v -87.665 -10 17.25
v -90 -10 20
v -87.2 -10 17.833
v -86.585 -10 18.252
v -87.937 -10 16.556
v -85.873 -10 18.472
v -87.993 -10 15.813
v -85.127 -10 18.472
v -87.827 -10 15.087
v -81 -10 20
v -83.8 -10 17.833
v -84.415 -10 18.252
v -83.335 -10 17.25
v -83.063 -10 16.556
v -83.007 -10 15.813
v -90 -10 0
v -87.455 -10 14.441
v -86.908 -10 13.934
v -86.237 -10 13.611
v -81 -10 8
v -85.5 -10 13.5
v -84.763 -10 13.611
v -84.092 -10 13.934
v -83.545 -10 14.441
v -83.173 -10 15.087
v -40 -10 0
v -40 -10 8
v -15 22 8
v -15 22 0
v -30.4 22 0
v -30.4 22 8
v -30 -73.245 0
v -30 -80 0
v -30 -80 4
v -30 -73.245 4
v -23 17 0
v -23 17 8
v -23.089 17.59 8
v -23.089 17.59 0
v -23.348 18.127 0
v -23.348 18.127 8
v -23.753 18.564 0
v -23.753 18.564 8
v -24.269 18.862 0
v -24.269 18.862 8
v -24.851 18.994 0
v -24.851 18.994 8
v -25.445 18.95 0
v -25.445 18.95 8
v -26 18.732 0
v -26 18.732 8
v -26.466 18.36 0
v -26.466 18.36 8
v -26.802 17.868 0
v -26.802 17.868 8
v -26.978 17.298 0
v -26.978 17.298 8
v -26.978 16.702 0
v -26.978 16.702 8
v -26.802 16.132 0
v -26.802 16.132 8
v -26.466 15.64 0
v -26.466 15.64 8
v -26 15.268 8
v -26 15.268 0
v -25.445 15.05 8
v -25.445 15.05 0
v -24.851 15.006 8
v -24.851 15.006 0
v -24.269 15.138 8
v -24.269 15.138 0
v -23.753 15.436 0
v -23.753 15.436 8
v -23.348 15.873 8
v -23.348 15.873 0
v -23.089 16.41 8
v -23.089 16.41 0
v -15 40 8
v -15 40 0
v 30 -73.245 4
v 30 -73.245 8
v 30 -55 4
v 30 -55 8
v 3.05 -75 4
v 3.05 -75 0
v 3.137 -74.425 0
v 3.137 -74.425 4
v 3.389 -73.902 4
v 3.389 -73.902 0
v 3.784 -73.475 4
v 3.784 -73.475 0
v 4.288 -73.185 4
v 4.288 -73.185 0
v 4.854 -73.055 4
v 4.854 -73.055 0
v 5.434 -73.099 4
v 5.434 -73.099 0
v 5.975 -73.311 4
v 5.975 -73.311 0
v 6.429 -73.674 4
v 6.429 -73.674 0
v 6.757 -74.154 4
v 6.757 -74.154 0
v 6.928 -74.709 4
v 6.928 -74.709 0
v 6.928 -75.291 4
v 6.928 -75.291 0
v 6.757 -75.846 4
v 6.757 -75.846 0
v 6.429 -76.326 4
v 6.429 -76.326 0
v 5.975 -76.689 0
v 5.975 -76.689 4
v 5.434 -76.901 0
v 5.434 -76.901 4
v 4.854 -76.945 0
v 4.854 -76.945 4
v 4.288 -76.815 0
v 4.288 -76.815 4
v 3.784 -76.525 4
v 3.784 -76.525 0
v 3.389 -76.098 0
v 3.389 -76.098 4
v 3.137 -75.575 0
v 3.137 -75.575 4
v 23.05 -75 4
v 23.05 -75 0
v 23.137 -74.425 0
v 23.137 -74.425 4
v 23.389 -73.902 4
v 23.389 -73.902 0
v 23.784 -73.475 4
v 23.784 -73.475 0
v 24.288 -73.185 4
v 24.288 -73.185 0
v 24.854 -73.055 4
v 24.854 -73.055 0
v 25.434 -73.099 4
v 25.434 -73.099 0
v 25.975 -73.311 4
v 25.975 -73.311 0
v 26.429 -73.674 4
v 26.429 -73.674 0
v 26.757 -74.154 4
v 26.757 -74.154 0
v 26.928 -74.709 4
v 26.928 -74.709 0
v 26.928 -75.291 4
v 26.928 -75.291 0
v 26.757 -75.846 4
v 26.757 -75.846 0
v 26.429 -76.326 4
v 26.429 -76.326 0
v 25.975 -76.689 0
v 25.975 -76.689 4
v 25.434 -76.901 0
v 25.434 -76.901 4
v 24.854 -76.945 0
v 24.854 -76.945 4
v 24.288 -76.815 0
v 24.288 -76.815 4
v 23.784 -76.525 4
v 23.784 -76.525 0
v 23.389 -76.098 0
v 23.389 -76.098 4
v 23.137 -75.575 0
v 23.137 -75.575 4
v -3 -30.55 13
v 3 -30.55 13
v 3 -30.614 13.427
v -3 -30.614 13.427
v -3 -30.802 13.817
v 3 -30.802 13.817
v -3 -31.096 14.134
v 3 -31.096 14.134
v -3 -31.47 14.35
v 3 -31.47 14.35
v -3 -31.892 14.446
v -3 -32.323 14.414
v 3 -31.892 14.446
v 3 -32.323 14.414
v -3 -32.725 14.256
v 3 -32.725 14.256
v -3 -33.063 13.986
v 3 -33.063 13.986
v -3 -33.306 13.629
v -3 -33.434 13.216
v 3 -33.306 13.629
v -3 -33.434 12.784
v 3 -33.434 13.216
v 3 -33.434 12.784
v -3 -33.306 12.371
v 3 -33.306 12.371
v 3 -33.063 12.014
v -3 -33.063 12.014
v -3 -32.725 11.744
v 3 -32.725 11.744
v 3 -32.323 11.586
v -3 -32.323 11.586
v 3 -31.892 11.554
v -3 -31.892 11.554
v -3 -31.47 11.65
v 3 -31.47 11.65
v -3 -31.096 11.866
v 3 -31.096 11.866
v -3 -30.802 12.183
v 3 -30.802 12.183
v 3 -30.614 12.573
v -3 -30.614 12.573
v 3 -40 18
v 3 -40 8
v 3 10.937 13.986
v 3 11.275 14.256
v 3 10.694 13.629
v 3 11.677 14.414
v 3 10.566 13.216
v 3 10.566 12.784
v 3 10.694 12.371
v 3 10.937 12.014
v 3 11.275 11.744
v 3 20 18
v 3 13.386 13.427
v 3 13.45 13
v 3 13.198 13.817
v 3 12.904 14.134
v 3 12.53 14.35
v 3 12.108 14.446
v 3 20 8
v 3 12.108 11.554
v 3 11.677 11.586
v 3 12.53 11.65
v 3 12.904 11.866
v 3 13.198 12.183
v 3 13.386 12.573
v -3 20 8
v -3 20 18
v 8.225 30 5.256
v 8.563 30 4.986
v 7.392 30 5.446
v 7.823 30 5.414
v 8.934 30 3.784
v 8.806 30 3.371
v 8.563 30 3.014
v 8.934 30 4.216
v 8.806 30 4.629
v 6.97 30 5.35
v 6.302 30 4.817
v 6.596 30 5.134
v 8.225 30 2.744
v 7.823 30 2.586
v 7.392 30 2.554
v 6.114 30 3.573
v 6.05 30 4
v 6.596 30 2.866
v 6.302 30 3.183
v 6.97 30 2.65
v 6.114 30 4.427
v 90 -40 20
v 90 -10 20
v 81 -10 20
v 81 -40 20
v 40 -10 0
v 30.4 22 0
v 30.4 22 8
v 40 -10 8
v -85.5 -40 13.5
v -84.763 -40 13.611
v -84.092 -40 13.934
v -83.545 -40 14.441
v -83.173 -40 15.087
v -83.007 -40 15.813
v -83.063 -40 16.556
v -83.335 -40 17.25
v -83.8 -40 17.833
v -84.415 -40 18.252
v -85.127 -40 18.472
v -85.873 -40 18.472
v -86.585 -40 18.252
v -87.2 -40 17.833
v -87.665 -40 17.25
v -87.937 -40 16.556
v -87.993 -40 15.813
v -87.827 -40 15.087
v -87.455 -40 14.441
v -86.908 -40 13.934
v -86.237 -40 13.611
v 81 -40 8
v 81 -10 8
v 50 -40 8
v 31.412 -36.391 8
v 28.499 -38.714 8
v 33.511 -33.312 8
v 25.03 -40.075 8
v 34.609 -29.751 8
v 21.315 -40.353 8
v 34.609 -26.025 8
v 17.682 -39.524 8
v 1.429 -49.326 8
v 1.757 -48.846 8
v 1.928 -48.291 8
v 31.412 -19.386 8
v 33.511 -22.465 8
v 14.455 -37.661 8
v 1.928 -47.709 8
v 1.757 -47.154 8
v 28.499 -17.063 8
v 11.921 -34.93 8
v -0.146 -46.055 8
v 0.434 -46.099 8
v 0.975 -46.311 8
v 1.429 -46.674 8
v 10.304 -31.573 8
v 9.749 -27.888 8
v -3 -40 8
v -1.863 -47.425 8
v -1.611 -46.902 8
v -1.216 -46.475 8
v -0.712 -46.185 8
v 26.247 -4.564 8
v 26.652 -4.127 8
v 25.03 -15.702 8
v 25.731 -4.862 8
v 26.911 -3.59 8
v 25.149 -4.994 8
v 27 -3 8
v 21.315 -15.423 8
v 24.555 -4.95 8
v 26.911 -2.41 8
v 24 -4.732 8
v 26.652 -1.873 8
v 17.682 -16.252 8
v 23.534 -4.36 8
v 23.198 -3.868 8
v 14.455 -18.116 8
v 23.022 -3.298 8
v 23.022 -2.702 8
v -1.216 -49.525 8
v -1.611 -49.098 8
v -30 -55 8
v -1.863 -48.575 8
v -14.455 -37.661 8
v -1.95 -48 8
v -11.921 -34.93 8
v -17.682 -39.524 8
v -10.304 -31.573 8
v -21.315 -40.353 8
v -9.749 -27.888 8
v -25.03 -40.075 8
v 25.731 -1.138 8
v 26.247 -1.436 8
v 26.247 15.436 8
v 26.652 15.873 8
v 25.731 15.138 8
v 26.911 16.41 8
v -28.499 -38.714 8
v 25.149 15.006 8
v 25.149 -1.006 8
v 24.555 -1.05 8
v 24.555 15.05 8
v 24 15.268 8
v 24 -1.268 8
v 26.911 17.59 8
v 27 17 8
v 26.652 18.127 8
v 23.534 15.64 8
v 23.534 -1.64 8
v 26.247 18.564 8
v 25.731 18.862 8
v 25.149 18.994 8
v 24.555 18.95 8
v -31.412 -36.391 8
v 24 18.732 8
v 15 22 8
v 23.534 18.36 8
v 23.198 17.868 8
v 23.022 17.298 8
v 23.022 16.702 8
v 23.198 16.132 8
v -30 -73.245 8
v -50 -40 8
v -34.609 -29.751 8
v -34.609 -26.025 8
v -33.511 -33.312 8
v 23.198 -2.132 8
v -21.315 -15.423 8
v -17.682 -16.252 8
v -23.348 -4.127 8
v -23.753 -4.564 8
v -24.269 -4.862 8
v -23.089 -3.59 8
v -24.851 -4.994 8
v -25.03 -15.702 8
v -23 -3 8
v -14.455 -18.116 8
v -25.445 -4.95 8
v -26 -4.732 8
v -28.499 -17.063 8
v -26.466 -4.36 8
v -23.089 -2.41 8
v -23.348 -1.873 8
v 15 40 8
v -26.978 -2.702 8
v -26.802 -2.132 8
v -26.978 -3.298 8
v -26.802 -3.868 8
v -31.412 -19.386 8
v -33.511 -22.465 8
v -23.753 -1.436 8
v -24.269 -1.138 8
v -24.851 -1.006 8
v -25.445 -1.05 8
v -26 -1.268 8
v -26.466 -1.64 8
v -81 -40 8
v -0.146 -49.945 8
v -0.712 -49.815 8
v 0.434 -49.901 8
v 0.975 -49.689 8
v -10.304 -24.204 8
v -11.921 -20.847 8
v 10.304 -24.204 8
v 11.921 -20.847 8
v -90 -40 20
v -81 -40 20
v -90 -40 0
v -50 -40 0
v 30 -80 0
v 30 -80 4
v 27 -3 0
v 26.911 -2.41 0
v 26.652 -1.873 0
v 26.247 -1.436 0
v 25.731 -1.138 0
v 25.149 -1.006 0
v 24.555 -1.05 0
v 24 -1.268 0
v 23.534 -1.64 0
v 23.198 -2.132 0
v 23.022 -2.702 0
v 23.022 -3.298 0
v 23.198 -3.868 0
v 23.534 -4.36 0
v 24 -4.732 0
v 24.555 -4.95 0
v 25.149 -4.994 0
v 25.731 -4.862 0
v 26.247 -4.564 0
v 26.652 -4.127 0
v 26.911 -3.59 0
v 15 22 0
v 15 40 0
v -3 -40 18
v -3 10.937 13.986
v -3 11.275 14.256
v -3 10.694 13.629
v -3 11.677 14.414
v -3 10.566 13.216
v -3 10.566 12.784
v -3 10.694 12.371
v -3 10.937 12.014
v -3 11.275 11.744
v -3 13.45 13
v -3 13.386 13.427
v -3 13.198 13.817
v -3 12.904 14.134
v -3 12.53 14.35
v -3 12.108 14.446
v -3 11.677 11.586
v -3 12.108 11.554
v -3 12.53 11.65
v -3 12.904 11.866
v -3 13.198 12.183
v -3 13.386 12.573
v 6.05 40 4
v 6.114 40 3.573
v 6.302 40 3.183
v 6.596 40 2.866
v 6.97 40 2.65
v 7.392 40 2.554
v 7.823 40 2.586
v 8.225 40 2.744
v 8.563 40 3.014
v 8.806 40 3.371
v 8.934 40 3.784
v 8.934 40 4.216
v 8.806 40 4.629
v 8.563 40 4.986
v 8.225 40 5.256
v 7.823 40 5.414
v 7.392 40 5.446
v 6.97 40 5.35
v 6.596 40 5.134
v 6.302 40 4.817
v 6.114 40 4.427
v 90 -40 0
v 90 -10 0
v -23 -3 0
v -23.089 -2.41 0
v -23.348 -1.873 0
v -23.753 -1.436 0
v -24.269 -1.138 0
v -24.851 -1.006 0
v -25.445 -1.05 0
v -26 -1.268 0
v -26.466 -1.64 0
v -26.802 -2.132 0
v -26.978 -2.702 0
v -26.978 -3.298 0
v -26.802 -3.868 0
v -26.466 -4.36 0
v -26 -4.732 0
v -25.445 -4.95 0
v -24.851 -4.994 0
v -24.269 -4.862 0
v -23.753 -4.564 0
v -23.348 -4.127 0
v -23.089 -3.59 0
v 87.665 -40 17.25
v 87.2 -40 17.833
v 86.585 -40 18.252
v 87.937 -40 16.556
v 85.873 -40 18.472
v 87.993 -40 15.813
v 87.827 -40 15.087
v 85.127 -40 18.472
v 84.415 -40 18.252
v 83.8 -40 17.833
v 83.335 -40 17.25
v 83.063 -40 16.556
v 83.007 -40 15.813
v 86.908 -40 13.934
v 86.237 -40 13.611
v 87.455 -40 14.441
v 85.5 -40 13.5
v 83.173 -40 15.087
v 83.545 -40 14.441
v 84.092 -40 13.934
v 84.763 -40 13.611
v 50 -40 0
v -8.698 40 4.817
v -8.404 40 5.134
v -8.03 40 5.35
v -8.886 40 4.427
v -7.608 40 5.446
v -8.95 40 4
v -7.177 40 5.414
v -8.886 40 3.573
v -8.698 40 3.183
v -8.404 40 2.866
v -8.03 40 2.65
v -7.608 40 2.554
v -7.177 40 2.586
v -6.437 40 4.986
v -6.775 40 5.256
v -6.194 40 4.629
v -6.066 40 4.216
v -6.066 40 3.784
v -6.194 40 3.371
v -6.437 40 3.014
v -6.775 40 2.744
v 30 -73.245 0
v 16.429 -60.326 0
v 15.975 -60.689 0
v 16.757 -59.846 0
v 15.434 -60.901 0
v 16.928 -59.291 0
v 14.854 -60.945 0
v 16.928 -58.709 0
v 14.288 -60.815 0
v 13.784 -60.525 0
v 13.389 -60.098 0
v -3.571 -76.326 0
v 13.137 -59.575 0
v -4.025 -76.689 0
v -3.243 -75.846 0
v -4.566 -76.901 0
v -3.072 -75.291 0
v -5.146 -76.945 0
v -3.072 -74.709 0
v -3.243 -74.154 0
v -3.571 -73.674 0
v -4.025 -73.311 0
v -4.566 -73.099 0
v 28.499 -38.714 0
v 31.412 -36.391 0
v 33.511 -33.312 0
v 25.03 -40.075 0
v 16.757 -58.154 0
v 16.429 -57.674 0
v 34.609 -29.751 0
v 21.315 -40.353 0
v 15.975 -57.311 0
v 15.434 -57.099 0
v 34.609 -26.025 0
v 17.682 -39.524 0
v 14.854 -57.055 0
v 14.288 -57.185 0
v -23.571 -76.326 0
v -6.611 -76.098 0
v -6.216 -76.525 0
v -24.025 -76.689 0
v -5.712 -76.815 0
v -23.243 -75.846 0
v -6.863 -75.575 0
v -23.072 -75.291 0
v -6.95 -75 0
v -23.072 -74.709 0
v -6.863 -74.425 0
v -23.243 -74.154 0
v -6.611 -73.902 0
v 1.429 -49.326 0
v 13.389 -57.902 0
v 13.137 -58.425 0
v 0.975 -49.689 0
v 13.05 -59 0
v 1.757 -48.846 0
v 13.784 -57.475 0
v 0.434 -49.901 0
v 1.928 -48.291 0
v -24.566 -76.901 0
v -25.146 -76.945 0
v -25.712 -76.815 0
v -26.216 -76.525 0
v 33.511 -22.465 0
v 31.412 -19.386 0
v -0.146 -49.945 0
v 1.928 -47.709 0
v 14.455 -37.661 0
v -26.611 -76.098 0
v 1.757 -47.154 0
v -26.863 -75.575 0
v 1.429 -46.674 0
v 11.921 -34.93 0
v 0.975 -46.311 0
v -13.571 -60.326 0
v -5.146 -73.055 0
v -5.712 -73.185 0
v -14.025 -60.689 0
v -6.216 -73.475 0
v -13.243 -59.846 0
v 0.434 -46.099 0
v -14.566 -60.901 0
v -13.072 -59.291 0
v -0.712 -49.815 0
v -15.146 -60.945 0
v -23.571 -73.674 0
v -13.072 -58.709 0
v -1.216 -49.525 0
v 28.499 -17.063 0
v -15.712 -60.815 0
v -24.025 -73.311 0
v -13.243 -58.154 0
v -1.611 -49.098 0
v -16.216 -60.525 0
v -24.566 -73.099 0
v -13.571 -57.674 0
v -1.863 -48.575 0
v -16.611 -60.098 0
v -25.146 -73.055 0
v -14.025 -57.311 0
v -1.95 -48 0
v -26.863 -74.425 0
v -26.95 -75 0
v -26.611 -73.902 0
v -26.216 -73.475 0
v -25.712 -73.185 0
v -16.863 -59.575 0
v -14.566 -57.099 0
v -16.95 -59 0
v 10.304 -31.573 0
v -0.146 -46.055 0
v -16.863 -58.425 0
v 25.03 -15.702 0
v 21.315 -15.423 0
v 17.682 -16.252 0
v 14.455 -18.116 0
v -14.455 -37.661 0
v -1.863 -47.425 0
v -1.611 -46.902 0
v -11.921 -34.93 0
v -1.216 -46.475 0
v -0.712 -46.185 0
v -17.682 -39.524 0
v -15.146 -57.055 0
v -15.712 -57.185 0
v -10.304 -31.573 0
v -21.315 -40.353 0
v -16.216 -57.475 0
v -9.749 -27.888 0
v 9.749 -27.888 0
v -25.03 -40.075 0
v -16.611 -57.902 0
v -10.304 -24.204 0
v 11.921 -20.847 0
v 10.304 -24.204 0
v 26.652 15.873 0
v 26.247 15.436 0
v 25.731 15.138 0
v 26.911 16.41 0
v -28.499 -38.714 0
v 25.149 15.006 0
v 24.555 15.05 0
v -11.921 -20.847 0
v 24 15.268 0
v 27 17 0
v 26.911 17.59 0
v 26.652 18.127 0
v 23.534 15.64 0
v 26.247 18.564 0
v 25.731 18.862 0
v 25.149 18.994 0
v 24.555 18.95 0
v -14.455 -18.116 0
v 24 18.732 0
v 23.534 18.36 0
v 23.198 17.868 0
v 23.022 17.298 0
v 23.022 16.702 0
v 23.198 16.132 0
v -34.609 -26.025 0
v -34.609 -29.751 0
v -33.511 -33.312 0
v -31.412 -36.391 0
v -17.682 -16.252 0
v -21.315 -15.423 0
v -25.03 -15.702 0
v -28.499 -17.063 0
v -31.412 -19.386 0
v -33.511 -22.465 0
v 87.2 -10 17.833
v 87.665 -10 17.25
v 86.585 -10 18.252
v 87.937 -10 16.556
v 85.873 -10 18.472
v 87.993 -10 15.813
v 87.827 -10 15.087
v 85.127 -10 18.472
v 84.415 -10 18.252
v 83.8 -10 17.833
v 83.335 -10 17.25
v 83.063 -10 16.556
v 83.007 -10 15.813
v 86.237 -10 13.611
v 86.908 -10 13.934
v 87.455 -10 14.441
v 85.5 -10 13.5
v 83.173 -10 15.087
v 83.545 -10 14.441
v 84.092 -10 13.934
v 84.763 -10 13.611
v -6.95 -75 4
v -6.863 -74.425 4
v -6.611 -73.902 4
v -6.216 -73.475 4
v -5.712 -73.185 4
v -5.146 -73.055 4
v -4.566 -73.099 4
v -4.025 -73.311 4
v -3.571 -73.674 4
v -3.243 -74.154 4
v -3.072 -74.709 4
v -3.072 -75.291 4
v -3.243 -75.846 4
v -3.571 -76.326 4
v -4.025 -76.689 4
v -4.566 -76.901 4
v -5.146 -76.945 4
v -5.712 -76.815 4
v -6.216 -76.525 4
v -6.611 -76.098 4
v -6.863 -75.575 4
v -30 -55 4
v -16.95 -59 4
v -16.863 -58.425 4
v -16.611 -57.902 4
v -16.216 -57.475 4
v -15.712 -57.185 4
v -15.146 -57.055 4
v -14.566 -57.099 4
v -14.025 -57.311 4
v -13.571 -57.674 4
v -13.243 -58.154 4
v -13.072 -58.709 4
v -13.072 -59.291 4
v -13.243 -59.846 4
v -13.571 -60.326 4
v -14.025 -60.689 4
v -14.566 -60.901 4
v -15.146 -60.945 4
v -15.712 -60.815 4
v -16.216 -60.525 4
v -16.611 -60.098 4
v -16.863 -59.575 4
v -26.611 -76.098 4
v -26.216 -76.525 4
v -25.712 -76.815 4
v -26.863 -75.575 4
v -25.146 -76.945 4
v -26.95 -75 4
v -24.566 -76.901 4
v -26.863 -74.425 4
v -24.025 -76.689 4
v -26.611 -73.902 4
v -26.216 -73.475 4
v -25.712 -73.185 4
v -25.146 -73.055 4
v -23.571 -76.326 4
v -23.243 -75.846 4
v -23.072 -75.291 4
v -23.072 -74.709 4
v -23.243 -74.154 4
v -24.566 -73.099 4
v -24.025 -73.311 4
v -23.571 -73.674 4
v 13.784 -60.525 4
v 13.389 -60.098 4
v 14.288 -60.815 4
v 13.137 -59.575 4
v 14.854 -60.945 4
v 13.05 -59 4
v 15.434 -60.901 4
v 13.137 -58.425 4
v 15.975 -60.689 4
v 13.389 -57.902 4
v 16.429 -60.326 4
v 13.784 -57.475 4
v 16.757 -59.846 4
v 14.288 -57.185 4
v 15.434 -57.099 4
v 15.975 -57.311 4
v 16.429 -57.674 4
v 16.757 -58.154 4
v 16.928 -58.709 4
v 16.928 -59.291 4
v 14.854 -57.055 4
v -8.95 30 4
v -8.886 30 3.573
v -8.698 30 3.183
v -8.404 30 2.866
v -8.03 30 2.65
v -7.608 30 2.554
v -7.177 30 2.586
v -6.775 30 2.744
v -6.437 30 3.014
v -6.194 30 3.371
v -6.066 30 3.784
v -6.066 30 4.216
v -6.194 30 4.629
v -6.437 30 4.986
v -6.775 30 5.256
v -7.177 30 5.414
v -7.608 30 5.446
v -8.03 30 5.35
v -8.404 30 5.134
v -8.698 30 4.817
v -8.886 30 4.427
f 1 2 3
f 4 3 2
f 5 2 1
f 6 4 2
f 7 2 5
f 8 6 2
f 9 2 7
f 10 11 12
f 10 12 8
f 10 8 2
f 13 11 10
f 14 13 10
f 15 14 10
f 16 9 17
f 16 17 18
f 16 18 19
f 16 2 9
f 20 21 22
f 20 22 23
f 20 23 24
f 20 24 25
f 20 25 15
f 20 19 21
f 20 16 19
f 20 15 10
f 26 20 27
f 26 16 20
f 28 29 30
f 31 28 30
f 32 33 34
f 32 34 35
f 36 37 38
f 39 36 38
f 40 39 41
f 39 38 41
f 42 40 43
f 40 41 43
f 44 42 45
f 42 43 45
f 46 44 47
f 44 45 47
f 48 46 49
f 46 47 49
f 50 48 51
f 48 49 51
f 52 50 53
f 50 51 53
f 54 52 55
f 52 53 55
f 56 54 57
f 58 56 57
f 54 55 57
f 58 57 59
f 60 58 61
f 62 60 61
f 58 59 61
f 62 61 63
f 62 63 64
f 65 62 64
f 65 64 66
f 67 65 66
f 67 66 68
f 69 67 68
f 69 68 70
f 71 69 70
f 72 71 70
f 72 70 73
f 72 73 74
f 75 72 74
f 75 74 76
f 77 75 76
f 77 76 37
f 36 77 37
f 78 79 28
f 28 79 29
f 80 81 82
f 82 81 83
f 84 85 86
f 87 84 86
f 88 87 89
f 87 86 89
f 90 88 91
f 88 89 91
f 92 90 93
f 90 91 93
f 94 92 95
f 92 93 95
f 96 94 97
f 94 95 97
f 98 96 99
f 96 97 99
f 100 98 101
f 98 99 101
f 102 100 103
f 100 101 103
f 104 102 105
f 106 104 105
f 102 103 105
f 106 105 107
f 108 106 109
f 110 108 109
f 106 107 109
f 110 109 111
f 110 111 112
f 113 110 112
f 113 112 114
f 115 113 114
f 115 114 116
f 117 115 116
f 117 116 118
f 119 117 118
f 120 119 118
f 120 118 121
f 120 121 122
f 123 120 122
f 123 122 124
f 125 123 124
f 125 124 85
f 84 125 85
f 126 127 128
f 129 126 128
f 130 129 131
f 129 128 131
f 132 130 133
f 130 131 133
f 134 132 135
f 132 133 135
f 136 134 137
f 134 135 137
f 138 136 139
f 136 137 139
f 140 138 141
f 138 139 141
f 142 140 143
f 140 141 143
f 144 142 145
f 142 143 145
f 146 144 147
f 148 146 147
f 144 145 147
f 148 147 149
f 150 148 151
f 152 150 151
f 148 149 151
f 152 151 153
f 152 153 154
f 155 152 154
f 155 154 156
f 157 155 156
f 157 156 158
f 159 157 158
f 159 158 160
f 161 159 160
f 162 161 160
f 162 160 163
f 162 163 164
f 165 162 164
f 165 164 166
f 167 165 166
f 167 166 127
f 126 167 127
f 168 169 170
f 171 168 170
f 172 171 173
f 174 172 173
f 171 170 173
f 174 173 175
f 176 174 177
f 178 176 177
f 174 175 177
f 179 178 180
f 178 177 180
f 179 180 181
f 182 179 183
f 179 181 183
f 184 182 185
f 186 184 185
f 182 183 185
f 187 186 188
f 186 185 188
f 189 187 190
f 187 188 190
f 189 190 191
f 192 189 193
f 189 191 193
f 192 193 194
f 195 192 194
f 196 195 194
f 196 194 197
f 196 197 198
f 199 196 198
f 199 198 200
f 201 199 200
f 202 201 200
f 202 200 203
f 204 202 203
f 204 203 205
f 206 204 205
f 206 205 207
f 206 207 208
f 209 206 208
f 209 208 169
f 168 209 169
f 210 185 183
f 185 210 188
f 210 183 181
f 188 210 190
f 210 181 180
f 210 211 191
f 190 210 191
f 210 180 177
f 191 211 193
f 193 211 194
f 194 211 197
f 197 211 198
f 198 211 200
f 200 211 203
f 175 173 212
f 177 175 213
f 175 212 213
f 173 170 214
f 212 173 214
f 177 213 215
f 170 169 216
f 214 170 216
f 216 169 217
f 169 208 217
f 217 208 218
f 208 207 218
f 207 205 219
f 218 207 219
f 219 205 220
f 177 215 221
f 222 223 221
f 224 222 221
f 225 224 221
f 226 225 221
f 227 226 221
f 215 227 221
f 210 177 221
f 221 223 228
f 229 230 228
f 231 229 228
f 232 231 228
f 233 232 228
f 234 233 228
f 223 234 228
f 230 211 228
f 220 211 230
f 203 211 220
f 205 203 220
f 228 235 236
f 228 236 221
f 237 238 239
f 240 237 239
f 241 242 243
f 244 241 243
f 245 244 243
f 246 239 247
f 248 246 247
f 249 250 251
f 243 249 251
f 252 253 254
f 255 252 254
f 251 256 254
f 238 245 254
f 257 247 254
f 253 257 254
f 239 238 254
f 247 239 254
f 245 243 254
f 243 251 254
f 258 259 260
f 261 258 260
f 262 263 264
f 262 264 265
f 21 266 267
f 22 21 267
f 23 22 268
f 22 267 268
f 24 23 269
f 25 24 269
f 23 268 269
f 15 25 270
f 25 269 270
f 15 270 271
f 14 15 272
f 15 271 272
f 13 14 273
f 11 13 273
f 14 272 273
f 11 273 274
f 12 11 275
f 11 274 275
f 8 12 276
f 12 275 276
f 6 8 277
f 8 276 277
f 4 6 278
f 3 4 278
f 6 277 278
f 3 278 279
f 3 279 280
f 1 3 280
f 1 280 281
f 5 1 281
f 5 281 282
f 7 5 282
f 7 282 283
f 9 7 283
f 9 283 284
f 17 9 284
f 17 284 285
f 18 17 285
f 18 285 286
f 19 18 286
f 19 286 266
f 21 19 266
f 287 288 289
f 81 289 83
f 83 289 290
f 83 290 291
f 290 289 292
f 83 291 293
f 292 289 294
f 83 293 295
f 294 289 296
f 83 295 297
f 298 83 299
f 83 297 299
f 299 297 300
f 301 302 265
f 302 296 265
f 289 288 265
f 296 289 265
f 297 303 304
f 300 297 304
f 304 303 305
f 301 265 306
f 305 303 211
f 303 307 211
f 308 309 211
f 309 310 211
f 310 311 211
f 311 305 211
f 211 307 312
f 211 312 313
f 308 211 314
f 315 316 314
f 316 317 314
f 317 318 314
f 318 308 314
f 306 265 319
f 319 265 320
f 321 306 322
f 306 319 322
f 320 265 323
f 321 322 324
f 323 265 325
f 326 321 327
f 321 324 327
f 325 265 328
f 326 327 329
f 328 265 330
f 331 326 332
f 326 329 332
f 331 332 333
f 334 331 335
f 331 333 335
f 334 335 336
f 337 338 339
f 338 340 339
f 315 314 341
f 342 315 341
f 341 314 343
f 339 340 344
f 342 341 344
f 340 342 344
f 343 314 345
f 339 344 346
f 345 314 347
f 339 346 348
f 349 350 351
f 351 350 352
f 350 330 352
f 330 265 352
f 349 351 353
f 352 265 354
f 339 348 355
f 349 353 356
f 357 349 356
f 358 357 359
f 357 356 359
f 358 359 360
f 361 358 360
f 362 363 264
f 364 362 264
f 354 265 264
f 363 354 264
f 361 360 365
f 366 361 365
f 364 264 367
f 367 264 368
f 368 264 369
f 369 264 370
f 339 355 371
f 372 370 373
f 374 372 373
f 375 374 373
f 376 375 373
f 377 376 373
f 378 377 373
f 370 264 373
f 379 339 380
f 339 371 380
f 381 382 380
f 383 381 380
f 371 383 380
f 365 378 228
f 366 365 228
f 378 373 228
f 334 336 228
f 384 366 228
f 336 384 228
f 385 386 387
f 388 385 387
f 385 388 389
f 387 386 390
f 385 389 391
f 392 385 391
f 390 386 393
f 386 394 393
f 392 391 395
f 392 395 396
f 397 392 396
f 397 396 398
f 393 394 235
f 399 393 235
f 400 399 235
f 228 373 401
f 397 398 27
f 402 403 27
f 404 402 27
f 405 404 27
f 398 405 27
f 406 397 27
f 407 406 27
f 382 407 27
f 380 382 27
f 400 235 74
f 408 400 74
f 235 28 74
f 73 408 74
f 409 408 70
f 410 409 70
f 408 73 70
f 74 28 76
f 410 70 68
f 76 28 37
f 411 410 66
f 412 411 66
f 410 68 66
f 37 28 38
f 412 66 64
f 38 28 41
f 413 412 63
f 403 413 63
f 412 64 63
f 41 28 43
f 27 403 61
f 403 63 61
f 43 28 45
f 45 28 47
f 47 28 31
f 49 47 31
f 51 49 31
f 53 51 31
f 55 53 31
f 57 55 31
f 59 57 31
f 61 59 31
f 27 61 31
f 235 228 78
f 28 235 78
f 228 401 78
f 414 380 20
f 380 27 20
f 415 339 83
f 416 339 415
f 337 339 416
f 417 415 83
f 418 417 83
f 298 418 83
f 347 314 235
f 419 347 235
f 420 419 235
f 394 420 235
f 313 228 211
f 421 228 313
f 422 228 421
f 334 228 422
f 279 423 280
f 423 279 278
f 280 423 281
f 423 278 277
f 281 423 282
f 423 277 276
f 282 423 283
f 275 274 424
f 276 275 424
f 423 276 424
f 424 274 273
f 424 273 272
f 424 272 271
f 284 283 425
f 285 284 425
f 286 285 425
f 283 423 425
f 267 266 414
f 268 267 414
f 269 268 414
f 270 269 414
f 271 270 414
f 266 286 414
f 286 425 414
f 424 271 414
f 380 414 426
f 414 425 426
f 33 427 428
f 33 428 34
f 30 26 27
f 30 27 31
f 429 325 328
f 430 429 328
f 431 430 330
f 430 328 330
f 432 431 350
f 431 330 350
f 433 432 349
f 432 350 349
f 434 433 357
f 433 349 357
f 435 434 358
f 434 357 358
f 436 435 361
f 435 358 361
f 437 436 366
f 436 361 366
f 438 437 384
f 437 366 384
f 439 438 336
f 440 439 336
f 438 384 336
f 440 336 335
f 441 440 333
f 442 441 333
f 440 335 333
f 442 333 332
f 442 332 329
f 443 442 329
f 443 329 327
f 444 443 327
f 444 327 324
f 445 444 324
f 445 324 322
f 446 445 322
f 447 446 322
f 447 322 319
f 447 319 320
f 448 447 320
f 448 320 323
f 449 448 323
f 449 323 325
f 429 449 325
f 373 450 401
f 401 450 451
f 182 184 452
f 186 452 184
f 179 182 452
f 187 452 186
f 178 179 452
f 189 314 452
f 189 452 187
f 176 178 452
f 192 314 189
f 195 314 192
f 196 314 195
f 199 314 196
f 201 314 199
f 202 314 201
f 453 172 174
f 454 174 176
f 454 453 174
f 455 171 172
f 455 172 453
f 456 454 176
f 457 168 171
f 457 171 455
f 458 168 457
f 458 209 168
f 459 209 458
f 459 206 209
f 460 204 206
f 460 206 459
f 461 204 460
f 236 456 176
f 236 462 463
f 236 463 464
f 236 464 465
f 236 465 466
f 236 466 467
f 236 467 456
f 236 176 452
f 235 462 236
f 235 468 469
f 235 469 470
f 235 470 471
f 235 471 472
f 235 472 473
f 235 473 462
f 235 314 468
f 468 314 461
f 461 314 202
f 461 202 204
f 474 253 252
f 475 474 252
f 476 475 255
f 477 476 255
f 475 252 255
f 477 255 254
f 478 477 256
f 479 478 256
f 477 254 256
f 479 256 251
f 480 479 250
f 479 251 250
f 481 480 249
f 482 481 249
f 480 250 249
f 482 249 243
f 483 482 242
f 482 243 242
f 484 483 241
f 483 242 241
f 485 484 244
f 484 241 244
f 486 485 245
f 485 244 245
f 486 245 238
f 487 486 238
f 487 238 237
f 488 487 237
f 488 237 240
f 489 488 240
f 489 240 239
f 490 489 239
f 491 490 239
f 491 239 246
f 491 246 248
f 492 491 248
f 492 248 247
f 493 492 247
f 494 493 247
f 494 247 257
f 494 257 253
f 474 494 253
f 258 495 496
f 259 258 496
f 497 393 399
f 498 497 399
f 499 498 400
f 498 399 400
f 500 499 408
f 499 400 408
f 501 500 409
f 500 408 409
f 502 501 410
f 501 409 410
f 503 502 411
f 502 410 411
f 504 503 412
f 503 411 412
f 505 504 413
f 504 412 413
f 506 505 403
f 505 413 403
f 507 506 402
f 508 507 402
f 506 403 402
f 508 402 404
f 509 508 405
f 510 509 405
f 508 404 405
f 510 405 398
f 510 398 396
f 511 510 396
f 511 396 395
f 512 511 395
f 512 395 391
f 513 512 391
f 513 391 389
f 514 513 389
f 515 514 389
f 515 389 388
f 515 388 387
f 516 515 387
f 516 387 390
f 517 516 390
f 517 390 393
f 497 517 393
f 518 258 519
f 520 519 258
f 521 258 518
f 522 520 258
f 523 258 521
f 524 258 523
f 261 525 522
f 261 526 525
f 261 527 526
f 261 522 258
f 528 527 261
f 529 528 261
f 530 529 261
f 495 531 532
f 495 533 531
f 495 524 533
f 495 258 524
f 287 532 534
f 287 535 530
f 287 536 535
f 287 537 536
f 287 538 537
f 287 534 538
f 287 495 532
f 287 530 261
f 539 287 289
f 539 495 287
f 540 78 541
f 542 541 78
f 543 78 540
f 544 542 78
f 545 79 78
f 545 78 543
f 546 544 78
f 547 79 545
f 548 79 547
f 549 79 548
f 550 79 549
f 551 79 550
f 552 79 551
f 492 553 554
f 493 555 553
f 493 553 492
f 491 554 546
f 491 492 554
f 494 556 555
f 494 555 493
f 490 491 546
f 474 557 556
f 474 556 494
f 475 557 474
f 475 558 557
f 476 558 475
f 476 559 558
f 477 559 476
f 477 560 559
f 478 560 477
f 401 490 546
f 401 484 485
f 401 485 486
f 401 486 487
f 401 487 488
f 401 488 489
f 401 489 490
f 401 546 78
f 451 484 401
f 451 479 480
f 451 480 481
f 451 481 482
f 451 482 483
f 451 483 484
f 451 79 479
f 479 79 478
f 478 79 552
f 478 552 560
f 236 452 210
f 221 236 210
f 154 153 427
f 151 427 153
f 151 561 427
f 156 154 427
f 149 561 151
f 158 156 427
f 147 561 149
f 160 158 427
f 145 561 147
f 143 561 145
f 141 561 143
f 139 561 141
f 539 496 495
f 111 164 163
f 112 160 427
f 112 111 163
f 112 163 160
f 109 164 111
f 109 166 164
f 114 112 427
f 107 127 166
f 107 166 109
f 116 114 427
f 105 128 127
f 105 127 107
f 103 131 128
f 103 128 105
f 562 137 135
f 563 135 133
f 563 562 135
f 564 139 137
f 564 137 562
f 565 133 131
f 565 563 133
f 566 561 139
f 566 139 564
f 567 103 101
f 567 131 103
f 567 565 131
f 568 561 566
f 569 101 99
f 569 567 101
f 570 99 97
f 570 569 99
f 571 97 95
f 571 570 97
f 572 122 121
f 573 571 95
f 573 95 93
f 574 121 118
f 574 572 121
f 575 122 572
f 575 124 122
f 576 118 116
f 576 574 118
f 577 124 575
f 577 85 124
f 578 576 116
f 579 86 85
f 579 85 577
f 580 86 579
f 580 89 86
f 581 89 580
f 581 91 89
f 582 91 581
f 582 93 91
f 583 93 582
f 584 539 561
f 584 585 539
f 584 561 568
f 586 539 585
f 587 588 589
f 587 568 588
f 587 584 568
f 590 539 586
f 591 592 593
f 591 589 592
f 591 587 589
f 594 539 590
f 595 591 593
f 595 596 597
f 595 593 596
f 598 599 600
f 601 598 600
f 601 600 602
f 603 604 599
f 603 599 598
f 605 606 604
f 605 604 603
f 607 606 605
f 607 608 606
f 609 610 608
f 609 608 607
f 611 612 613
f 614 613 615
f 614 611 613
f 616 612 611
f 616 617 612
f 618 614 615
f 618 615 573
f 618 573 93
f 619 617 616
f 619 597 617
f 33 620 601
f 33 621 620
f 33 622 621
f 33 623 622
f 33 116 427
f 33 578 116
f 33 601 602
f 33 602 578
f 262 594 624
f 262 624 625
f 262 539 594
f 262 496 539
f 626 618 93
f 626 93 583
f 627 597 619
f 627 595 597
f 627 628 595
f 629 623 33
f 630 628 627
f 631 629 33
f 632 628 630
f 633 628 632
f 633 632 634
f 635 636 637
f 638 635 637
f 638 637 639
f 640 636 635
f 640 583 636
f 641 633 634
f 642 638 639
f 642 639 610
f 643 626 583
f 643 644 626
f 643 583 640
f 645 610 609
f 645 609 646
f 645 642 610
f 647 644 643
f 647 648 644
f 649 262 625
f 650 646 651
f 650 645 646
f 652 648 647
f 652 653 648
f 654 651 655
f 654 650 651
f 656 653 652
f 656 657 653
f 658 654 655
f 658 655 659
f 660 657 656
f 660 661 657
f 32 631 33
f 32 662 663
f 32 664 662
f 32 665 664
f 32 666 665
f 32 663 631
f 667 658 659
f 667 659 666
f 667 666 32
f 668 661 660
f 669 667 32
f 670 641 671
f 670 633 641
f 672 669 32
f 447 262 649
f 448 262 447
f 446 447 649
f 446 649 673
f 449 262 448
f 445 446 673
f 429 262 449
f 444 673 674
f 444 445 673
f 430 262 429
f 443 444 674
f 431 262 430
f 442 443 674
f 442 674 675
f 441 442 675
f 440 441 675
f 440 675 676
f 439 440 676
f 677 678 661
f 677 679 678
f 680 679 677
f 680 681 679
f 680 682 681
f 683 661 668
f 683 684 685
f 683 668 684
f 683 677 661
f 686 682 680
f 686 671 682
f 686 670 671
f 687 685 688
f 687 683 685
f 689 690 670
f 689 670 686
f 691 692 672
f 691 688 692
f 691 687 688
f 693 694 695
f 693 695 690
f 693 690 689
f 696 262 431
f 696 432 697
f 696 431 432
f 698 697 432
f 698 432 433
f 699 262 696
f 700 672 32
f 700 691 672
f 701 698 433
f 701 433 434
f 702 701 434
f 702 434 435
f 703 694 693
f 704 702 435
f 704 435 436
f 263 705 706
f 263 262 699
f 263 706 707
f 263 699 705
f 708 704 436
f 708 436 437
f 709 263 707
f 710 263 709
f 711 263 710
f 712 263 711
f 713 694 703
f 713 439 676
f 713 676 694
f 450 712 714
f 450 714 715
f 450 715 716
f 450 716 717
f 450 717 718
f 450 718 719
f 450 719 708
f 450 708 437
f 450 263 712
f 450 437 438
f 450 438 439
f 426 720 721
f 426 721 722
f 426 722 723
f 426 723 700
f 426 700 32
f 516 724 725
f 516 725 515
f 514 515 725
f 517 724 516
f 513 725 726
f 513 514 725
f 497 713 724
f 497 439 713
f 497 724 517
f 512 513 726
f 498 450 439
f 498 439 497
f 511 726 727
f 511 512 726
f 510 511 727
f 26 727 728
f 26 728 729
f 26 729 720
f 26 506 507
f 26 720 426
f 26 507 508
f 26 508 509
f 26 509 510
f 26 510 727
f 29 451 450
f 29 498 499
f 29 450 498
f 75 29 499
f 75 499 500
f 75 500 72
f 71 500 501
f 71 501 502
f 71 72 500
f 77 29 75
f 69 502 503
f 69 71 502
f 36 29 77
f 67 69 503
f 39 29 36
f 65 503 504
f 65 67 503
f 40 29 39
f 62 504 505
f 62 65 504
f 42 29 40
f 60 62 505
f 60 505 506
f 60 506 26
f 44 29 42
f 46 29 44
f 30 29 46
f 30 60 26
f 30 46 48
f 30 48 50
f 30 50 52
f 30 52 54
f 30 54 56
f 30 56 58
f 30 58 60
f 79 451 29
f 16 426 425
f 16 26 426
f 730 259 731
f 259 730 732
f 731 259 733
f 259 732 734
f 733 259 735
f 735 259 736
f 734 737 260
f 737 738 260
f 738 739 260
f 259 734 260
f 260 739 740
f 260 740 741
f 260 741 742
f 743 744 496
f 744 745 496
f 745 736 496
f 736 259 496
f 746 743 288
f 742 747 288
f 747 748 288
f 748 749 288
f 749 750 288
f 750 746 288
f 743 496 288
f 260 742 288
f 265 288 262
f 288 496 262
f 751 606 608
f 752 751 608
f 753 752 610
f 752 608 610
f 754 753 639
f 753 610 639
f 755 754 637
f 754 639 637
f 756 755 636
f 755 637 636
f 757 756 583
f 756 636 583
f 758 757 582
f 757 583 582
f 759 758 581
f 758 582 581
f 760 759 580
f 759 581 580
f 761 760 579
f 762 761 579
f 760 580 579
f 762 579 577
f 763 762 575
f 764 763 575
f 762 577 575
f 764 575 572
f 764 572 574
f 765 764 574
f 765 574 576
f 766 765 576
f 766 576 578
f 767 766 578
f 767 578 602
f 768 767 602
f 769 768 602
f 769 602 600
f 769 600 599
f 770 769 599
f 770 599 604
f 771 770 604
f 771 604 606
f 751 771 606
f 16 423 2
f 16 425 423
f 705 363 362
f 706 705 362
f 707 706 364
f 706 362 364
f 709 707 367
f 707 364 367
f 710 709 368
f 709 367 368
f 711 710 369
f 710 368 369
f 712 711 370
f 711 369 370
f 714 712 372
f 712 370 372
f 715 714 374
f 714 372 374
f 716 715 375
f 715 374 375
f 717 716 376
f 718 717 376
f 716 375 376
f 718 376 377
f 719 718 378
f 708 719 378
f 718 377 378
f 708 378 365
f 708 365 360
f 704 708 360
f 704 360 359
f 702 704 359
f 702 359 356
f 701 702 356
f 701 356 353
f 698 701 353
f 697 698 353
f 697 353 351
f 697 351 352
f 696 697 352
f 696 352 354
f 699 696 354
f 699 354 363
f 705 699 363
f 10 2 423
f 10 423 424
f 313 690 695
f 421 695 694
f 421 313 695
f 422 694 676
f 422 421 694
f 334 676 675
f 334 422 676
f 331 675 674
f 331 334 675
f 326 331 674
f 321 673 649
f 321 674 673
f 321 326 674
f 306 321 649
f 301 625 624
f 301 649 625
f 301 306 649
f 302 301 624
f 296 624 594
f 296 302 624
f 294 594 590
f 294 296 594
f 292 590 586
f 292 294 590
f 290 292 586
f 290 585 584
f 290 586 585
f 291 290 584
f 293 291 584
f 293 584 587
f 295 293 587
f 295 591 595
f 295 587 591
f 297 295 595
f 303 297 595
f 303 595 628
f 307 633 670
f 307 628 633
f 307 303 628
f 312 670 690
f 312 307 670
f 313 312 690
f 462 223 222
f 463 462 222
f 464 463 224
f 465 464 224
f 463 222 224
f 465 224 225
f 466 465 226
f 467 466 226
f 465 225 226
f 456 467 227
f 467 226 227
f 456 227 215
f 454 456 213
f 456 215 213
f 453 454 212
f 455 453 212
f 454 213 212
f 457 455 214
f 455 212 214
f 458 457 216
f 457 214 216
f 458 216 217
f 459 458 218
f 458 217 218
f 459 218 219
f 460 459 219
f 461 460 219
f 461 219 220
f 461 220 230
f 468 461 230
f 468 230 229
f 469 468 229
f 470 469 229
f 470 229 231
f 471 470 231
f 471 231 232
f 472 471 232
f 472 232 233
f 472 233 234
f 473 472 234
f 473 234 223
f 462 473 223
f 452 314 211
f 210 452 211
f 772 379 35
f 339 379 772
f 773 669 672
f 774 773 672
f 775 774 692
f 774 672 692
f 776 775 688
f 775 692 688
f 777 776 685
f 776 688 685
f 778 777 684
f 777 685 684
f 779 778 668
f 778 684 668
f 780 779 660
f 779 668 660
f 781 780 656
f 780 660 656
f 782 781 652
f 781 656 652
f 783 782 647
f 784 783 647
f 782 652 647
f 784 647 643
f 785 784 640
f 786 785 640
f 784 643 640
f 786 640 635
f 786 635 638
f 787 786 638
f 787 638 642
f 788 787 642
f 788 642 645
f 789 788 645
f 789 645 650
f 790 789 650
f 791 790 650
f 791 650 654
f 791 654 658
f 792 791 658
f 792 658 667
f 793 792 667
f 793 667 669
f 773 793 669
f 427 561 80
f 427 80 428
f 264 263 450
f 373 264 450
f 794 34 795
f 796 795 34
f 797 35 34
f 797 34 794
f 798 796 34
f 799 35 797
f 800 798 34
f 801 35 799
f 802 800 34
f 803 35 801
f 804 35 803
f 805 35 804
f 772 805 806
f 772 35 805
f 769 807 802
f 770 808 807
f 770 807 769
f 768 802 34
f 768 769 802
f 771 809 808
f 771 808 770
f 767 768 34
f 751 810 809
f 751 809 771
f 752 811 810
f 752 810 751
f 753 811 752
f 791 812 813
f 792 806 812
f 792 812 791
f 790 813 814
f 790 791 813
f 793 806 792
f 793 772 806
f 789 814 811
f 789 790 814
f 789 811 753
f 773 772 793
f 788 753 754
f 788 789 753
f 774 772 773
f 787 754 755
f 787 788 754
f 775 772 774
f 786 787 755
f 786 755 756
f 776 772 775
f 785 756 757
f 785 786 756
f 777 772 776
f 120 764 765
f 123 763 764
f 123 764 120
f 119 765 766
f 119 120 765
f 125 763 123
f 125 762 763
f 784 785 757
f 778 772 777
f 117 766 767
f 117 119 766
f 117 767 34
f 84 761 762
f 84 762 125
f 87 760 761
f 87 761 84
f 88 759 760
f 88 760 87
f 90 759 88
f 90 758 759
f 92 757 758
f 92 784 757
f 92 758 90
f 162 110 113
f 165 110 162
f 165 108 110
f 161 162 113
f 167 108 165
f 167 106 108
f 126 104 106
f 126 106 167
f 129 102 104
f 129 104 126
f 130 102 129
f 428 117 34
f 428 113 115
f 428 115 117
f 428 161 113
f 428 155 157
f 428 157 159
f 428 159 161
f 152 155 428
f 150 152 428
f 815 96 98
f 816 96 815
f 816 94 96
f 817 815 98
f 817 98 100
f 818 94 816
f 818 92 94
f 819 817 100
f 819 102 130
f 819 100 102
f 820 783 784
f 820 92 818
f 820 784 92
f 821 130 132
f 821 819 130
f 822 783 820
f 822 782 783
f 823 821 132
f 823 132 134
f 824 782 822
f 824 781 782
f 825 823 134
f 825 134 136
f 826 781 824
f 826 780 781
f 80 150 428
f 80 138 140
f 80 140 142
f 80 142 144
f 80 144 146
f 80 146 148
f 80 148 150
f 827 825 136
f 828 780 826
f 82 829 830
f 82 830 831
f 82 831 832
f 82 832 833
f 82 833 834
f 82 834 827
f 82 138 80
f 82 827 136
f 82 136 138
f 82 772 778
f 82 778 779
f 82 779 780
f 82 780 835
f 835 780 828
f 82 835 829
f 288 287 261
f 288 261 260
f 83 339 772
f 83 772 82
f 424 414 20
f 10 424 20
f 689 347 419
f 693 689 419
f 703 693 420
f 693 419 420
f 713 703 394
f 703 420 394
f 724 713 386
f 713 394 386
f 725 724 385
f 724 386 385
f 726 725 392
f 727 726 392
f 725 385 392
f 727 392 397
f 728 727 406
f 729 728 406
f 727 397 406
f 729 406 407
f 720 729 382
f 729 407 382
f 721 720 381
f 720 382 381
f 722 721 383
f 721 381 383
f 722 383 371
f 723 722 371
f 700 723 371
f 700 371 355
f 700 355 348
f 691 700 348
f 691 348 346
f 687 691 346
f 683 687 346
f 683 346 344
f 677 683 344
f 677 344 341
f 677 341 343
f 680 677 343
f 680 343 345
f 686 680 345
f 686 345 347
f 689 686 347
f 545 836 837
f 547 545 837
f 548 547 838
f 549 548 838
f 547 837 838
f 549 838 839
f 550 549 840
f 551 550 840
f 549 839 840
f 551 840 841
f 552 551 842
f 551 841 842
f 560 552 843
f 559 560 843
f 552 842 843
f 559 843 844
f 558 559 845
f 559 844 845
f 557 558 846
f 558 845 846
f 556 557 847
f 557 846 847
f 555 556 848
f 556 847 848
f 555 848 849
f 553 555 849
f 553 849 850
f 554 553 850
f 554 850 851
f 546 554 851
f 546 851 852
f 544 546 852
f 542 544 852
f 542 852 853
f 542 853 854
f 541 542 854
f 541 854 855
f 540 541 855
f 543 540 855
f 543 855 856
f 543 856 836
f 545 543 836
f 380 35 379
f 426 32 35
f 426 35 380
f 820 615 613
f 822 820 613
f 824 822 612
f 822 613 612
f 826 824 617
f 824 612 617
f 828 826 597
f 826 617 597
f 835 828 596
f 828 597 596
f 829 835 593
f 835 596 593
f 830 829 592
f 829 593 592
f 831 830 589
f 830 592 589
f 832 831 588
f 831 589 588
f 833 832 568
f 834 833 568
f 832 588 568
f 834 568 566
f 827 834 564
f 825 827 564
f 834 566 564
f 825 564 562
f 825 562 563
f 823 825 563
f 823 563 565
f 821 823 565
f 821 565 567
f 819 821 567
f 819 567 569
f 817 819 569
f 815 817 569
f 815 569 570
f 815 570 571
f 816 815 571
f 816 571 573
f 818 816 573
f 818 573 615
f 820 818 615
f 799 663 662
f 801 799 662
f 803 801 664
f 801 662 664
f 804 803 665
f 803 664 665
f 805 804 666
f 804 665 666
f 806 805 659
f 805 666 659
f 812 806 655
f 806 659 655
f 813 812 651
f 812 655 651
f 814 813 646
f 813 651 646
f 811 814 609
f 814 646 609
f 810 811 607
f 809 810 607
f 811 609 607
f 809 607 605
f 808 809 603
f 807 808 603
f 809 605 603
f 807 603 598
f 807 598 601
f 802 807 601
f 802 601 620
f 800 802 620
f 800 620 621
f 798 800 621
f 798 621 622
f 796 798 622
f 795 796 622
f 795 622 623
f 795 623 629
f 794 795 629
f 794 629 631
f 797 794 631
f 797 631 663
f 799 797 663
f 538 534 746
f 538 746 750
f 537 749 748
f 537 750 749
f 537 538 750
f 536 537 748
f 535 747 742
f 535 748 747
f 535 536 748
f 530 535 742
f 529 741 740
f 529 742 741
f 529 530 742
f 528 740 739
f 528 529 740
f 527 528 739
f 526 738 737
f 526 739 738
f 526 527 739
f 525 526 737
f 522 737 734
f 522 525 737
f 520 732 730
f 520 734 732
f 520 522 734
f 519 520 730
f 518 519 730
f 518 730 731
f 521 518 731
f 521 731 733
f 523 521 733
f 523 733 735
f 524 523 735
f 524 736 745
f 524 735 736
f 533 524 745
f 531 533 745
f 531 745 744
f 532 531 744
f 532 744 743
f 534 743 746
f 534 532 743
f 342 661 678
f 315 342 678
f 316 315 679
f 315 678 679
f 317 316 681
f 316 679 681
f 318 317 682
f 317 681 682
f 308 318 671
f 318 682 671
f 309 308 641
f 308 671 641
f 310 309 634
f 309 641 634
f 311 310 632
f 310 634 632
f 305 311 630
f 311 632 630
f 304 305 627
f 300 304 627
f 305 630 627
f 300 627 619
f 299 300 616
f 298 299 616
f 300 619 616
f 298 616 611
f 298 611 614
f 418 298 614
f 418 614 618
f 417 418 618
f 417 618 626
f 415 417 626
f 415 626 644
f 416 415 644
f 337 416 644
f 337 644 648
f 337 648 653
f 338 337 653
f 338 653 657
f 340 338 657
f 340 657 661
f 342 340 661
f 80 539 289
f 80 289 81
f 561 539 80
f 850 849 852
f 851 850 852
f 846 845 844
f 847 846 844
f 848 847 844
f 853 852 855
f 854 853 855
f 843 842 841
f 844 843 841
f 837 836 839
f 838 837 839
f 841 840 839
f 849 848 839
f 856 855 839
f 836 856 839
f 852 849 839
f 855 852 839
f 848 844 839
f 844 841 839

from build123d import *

# Parameters (mm, degrees)
EXTRUDE1_DEPTH                 = 8
EXTRUDE2_DEPTH                 = 8
SKETCH4_W                      = 6
SKETCH4_H                      = 60
EXTRUDE3_DEPTH                 = 10
F_4_0_4_DIAMETER_HOLE2_D       = 4
F_4_0_4_DIAMETER_HOLE2_DEPTH   = 15
SKETCH6_W                      = 9
SKETCH6_H                      = 30
EXTRUDE4_DEPTH                 = 12
F_5_0_5_DIAMETER_HOLE1_D       = 5
F_2_9_2_9_DIAMETER_HOLE1_D     = 2.9
F_2_9_2_9_DIAMETER_HOLE1_DEPTH = 10
SKETCH10_R                     = 12.5
EXTRUDE5_DEPTH                 = 10
F_2_9_2_9_DIAMETER_HOLE2_D     = 2.9
F_2_9_2_9_DIAMETER_HOLE2_DEPTH = 10
EXTRUDE8_DEPTH                 = 21
SKETCH15_W                     = 60
SKETCH15_H                     = 25
EXTRUDE9_DEPTH                 = 4
F_4_0_4_DIAMETER_HOLE4_D       = 3.9
F_4_0_4_DIAMETER_HOLE4_DEPTH   = 15
F_4_0_4_DIAMETER_HOLE5_D       = 3.9
F_4_0_4_DIAMETER_HOLE5_DEPTH   = 15


with BuildPart() as part:
    # Sketch1 → Extrude1 (new body)
    with BuildSketch(Plane.XY):
        Polygon((-40, -10), (-25, 40), (25, 40), (40, -10), (90, -10), (90, -40), (-90, -40), (-90, -10), align=None)
    extrude(amount=EXTRUDE1_DEPTH)

    # Sketch2 → Extrude2 (add)
    with BuildSketch(Plane.XY):
        Polygon((-50, -40), (50, -40), (30, -73.244533262), (30, -80), (-30, -80), (-30, -73.244533262), align=None)
    extrude(amount=EXTRUDE2_DEPTH)

    # Sketch4 → Extrude3 (add)
    with BuildSketch(Plane.XY.offset(8)):
        with Locations((0, -10)):
            Rectangle(SKETCH4_W, SKETCH4_H)
    extrude(amount=EXTRUDE3_DEPTH)

    # Ø4.0 (4) Diameter Hole2
    with Locations(Plane(origin=(25, -3, 0), x_dir=(-1, 0, 0), z_dir=(0, 0, -1))):
        with Locations((0, 0), (50, 0), (0, 20), (50, 20)):
            Hole(F_4_0_4_DIAMETER_HOLE2_D / 2, depth=F_4_0_4_DIAMETER_HOLE2_DEPTH)

    # Sketch6 → Extrude4 (add)
    with BuildSketch(Plane.XY.offset(8)):
        with Locations((-85.5, -25)):
            Rectangle(SKETCH6_W, SKETCH6_H)
    extrude4 = extrude(amount=EXTRUDE4_DEPTH)

    # Ø5.0 (5) Diameter Hole1 (through all)
    with Locations(Plane(origin=(-85.5, -10, 16), x_dir=(0, 0, 1), z_dir=(0, 1, 0))):
        with Locations((0, 0)):
            f_5_0_5_diameter_hole1 = Hole(F_5_0_5_DIAMETER_HOLE1_D / 2)

    # Mirror1: Extrude4, Ø5.0 (5) Diameter Hole1 across plane
    add(extrude4.mirror(Plane(origin=(0, 0, 0), x_dir=(0, 0, 1), z_dir=(1, 0, 0))))
    add(f_5_0_5_diameter_hole1.mirror(Plane(origin=(0, 0, 0), x_dir=(0, 0, 1), z_dir=(1, 0, 0))), mode=Mode.SUBTRACT)

    # Ø2.9 (2.9) Diameter Hole1
    with Locations(Plane(origin=(-7.5, 40, 4), x_dir=(1, 0, 0), z_dir=(0, 1, 0))):
        with Locations((0, 0), (15, 0)):
            Hole(F_2_9_2_9_DIAMETER_HOLE1_D / 2, depth=F_2_9_2_9_DIAMETER_HOLE1_DEPTH)

    # Sketch10 → Extrude5 (cut)
    with BuildSketch(Plane.XY.offset(8)):
        with Locations((-22.248705181, -27.888411791)):
            Circle(SKETCH10_R)
    extrude5 = extrude(amount=-EXTRUDE5_DEPTH, mode=Mode.SUBTRACT)

    # Mirror2: Extrude5 across plane
    add(extrude5.mirror(Plane(origin=(0, 0, 0), x_dir=(0, 0, 1), z_dir=(1, 0, 0))), mode=Mode.SUBTRACT)

    # Ø2.9 (2.9) Diameter Hole2
    with Locations(Plane(origin=(-3, 12, 13), x_dir=(0, -1, 0), z_dir=(-1, 0, 0))):
        with Locations((0, 0), (44, 0)):
            Hole(F_2_9_2_9_DIAMETER_HOLE2_D / 2, depth=F_2_9_2_9_DIAMETER_HOLE2_DEPTH)

    # Sketch14 → Extrude8 (cut, through all)
    with BuildSketch(Plane(origin=(0, 0, 0), x_dir=(-1, 0, 0), z_dir=(0, 0, -1))):
        Polygon((-30.4, 22), (-15, 22), (-15, 40), (-25, 40), align=None)
        Polygon((25, 40), (15, 40), (15, 22), (30.4, 22), align=None)
    extrude(amount=-EXTRUDE8_DEPTH, mode=Mode.SUBTRACT)

    # Sketch15 → Extrude9 (cut)
    with BuildSketch(Plane.XY.offset(8)):
        with Locations((0, -67.5)):
            Rectangle(SKETCH15_W, SKETCH15_H)
    extrude(amount=-EXTRUDE9_DEPTH, mode=Mode.SUBTRACT)

    # Ø4.0 (4) Diameter Hole4
    with Locations(Plane(origin=(15, -59, 4), x_dir=(1, 0, 0), z_dir=(0, 0, 1))):
        with Locations((0, 0), (-10, -16), (10, -16), (-20, -16), (-40, -16), (-30, 0)):
            Hole(F_4_0_4_DIAMETER_HOLE4_D / 2, depth=F_4_0_4_DIAMETER_HOLE4_DEPTH)

    # Ø4.0 (4) Diameter Hole5
    with Locations(Plane(origin=(0, -48, 8), x_dir=(1, 0, 0), z_dir=(0, 0, 1))):
        with Locations((0, 0)):
            Hole(F_4_0_4_DIAMETER_HOLE5_D / 2, depth=F_4_0_4_DIAMETER_HOLE5_DEPTH)


solid = part.part
